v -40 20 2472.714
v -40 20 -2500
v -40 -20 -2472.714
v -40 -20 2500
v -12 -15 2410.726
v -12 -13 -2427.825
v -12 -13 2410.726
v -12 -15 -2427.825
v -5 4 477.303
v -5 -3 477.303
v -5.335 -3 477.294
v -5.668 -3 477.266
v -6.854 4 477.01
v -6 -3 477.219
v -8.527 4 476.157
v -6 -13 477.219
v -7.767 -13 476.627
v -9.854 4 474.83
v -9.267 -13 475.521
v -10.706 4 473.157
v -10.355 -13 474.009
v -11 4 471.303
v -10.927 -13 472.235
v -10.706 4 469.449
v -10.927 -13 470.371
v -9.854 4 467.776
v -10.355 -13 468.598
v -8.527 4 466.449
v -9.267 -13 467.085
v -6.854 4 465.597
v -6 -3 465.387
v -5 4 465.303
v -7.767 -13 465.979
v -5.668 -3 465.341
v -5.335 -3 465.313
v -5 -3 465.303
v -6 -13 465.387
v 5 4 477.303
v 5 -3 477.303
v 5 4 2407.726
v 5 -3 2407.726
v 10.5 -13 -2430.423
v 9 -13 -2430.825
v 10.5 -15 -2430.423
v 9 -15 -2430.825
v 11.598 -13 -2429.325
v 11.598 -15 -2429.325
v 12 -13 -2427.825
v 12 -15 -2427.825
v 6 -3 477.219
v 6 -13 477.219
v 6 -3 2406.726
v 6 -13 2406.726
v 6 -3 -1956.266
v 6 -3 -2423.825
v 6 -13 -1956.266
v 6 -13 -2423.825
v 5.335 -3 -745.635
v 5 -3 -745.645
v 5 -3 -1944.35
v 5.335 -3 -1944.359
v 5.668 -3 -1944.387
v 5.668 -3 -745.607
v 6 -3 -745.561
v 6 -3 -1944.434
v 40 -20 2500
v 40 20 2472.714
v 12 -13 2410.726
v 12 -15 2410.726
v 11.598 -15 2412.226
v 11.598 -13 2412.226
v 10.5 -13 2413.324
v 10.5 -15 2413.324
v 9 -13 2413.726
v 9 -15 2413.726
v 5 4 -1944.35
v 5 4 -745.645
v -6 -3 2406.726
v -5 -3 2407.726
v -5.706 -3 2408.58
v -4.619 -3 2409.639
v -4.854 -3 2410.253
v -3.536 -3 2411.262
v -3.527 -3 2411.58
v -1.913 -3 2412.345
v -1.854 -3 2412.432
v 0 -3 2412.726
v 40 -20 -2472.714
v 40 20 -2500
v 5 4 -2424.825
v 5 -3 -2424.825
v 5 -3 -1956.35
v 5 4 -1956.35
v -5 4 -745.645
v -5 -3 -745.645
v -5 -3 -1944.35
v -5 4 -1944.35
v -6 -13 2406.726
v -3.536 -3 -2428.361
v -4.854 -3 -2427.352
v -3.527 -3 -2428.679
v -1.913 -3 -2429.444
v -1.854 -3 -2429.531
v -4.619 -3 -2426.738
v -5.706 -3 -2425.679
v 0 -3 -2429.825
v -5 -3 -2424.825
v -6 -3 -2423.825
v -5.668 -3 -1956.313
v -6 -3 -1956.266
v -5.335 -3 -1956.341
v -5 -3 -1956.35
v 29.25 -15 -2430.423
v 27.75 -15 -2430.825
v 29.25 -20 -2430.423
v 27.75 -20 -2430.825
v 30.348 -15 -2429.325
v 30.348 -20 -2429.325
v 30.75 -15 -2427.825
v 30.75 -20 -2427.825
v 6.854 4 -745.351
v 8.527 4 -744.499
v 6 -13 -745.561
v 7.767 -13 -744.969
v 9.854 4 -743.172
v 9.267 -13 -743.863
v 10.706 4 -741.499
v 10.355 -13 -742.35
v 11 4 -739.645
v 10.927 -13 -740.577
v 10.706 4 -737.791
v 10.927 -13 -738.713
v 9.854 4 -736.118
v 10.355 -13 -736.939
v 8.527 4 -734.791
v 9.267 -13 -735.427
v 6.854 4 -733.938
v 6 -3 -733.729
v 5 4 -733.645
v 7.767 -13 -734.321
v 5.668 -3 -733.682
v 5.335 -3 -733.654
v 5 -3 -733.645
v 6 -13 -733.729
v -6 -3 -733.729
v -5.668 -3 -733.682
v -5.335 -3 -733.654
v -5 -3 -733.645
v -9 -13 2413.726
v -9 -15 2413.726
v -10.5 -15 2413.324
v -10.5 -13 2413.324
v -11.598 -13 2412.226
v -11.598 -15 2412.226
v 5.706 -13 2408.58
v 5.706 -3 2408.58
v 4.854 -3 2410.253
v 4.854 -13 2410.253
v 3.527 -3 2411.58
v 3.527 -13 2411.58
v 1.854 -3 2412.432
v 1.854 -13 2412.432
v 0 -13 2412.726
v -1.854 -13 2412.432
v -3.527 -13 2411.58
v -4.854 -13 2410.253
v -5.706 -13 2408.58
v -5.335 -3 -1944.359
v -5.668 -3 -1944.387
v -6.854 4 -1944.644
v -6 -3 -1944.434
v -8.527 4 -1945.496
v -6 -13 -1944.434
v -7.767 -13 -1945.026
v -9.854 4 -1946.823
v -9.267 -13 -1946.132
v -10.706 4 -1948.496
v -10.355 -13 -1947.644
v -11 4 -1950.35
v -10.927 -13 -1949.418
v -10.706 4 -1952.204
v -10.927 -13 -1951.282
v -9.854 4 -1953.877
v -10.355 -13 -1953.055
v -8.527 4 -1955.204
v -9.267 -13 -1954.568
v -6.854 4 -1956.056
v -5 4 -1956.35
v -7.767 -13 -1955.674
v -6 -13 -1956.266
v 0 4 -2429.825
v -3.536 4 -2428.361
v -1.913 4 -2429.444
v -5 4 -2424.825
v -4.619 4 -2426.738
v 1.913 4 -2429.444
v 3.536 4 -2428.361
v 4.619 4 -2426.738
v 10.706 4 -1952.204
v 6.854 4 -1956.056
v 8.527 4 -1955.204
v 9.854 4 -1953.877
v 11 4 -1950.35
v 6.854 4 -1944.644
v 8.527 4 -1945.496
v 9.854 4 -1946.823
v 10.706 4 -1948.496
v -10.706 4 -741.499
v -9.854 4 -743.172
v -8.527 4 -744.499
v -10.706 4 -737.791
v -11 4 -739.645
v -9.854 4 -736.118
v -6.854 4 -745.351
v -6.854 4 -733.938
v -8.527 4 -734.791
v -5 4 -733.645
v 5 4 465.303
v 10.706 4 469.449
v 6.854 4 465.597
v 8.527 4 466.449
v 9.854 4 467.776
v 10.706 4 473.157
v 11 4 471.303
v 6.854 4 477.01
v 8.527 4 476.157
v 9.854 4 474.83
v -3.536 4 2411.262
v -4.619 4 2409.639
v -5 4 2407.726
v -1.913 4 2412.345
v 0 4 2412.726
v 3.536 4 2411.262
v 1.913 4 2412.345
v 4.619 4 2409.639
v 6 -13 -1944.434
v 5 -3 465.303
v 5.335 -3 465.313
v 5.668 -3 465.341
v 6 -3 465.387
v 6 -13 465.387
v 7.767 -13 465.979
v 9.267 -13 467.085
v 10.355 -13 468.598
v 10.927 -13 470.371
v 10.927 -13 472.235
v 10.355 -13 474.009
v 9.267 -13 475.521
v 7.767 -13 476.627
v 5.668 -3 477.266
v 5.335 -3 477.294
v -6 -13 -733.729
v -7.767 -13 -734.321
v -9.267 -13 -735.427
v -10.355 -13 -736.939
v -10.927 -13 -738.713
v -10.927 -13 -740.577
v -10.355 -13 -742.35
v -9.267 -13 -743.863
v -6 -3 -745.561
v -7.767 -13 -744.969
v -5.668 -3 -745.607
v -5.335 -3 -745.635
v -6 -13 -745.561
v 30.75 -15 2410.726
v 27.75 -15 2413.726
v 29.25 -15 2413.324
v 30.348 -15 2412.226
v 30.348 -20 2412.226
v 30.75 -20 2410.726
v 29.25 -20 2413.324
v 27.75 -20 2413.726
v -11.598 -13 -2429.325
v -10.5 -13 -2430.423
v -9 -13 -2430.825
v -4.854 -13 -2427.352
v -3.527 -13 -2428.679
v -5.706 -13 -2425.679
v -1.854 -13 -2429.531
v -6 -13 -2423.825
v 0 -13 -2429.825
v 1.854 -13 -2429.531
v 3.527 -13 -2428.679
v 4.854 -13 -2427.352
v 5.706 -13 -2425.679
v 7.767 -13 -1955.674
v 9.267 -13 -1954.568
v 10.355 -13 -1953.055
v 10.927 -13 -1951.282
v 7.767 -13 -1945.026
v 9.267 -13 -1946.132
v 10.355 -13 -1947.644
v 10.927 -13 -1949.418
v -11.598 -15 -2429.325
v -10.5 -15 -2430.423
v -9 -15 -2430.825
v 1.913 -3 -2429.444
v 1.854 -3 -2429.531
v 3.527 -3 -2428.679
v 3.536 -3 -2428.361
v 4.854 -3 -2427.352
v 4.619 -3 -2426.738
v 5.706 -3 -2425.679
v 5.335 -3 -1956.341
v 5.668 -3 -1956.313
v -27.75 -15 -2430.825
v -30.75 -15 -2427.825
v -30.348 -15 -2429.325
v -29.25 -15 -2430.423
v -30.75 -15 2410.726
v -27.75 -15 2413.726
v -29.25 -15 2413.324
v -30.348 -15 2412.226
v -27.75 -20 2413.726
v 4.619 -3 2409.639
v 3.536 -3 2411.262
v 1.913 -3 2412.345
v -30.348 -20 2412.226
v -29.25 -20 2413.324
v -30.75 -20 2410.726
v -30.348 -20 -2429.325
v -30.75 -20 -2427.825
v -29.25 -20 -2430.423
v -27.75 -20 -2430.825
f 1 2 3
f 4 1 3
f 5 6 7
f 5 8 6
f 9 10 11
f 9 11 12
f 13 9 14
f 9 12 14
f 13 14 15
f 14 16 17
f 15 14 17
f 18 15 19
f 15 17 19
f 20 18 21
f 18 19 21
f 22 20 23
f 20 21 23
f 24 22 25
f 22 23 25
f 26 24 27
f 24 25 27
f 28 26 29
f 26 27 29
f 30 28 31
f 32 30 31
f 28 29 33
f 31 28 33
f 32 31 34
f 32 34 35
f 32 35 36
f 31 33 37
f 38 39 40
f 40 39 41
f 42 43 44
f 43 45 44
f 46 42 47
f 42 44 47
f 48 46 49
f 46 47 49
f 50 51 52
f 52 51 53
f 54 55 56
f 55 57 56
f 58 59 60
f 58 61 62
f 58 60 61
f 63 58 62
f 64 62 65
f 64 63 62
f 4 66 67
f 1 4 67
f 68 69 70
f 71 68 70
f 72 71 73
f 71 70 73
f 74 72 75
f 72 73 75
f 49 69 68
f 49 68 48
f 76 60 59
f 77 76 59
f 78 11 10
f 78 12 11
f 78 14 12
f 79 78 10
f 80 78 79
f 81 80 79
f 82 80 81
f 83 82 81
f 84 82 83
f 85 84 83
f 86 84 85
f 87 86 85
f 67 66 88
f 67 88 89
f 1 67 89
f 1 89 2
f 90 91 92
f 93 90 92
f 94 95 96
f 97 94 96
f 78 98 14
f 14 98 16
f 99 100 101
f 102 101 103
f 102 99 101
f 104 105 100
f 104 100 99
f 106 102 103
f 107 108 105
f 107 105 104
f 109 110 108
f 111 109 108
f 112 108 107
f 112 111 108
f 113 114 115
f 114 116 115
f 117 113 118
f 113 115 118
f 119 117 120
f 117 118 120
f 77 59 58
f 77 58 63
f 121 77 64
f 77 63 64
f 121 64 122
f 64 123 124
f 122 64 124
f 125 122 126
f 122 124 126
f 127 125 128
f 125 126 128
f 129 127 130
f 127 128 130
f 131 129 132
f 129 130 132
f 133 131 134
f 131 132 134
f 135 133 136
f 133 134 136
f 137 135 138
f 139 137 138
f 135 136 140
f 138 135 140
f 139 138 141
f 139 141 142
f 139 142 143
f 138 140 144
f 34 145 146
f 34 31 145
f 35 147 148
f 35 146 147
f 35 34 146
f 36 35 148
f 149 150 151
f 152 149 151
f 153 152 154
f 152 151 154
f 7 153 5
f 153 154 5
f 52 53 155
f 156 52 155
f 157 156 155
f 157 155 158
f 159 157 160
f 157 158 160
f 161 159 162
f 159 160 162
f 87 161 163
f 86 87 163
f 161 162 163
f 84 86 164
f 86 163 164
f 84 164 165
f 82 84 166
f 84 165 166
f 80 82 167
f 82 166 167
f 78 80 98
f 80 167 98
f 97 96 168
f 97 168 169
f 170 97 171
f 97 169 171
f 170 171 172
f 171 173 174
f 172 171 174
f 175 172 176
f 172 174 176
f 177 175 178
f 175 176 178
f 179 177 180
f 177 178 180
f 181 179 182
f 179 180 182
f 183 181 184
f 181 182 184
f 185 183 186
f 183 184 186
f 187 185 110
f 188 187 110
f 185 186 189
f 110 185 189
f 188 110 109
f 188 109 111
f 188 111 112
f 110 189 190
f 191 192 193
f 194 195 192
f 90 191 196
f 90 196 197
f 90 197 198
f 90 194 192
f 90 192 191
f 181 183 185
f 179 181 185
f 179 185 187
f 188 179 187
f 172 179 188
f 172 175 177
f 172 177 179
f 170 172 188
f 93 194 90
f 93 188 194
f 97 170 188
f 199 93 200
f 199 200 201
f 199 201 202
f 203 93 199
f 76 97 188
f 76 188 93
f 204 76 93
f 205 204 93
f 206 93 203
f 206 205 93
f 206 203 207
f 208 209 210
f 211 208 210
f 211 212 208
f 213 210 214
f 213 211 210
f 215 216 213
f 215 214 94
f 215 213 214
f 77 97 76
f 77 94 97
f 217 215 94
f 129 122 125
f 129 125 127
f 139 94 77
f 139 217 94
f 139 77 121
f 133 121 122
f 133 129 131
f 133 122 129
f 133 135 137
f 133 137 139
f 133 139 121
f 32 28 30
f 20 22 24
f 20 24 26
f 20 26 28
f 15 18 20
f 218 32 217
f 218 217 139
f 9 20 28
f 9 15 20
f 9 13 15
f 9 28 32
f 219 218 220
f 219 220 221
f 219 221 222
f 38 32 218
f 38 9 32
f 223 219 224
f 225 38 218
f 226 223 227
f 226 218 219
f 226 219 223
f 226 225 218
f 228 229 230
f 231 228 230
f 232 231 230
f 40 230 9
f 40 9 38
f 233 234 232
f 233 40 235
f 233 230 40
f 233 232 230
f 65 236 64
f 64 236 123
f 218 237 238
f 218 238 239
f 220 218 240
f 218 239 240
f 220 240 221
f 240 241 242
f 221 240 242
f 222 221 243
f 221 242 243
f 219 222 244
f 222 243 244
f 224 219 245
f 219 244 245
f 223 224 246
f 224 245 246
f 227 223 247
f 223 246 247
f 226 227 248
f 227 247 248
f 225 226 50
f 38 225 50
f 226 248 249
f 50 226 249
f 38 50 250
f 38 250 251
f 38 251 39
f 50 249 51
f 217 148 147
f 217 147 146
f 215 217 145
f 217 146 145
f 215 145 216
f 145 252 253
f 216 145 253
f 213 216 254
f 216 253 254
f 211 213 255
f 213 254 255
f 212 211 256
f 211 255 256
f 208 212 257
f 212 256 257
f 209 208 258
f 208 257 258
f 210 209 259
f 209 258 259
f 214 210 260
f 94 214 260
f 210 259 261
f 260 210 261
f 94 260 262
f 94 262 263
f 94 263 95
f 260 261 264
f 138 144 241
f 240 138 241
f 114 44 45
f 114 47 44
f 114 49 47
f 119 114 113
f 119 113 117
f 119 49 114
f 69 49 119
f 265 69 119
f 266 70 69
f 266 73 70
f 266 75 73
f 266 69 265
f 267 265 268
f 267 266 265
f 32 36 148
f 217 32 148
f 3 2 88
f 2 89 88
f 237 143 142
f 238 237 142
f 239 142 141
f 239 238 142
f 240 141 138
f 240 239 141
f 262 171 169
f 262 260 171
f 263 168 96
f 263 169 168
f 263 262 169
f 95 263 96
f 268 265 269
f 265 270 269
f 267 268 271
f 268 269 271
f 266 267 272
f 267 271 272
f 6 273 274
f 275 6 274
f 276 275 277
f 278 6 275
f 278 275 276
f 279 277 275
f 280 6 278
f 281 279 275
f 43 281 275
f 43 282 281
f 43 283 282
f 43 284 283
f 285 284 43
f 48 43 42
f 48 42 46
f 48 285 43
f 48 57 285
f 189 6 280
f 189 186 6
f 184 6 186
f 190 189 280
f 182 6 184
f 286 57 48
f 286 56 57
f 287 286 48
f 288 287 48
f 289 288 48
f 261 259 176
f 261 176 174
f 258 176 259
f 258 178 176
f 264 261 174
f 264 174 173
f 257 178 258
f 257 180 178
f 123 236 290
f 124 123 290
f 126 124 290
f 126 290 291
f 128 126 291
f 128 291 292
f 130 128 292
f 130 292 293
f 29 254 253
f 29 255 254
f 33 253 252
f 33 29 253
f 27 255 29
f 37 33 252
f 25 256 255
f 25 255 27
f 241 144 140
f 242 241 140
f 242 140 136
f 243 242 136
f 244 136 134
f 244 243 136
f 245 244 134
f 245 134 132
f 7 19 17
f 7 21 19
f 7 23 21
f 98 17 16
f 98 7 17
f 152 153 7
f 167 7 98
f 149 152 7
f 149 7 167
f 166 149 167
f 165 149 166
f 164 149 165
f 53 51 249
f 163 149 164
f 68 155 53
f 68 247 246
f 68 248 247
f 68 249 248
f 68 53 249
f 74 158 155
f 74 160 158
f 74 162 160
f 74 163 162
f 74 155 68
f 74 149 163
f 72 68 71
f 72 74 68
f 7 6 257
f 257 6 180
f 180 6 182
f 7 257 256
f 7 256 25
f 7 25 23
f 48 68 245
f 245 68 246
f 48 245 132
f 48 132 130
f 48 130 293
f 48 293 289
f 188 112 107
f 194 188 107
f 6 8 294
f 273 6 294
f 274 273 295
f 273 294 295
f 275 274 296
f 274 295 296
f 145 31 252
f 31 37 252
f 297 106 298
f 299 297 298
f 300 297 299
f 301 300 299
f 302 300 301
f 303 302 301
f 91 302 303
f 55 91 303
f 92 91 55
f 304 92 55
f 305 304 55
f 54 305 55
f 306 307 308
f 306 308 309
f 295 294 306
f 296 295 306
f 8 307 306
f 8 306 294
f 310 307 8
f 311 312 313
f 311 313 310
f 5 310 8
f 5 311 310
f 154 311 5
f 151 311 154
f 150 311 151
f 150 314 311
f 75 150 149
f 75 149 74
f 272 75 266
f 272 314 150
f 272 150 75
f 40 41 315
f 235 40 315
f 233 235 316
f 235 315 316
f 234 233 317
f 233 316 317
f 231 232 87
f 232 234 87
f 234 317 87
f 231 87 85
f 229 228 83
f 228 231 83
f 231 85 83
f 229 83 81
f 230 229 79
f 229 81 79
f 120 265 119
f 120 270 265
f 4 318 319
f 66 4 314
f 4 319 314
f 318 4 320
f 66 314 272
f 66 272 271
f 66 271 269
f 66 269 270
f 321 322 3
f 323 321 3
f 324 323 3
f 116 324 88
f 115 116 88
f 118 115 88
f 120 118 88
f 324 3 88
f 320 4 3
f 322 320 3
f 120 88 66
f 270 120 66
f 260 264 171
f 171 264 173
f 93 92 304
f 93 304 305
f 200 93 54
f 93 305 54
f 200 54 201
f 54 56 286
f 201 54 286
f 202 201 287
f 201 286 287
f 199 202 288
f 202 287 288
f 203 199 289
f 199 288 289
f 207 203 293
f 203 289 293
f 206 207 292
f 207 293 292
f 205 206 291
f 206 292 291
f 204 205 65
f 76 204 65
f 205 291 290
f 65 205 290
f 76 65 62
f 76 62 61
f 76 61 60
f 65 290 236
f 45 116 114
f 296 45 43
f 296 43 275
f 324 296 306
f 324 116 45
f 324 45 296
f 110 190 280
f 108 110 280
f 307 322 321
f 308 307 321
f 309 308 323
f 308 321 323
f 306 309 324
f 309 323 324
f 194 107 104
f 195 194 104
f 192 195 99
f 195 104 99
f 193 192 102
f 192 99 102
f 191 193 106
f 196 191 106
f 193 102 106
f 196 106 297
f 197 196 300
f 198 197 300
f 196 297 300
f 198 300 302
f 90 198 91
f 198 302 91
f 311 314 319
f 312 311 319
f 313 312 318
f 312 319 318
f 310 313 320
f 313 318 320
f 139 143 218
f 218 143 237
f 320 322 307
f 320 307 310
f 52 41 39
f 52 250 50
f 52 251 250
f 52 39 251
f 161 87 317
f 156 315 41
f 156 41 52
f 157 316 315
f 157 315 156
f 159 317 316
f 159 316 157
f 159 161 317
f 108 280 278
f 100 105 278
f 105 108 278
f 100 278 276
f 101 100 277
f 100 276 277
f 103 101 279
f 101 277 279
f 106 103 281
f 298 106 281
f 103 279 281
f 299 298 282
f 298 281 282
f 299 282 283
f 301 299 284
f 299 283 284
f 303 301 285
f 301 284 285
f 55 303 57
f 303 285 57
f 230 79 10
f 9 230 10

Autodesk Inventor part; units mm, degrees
ref_plane "YZ Plane" through (0, 0, 0) normal (1, 0, 0) x (0, 1, 0)
ref_plane "XZ Plane" through (0, 0, 0) normal (0, 1, 0) x (-1, 0, 0)
ref_plane "XY Plane" through (0, 0, 0) normal (0, 0, 1) x (1, 0, 0)
sketch "Sketch1" plane through (0, 0, 0) normal (0, 0, 1) x (1, 0, 0)
  line L0 (-56, 0) -> (56, 0) projected
  line L1 (40, -20) -> (40, 20)
  line L2 (40, 20) -> (-40, 20)
  line L3 (-40, 20) -> (-40, -20)
  line L4 (-40, -20) -> (40, -20)
  point P0 (0, 0)
  dimension "d8" = 80
  dimension "d9" = 40
  dimension "d11" = 40
extrude "brædt" add sketch "Sketch1" along normal mid plane 5000
sketch "Sketch2" plane through (40, -20, -2500) normal (0, -1, 0) x (1, 0, 0)
  line L0 (0, 5000) -> (0, 0) projected
  line L1 (-80, 5000) -> (0, 5000) projected
  line L2 (-80, 0) -> (-80, 5000) projected
  line L3 (0, 0) -> (-80, 0) projected
  line L4 (-40, -1000) -> (-40, 6000) projected
  line L5 (-12.25, 69.175) -> (-67.75, 69.175)
  line L6 (-70.75, 72.175) -> (-70.75, 4910.726)
  line L7 (-67.75, 4913.726) -> (-12.25, 4913.726)
  line L8 (-9.25, 4910.726) -> (-9.25, 72.175)
  arc A0 (-70.75, 72.175) -> (-67.75, 69.175) centre (-67.75, 72.175) ccw
  arc A1 (-12.25, 69.175) -> (-9.25, 72.175) centre (-12.25, 72.175) ccw
  arc A2 (-67.75, 4913.726) -> (-70.75, 4910.726) centre (-67.75, 4910.726) ccw
  arc A3 (-9.25, 4910.726) -> (-12.25, 4913.726) centre (-12.25, 4910.726) ccw
  point P0 (-40, 2500)
  dimension "d12" = 61.5
  dimension "d13" = 4844.551
  dimension "d14" = 3
  dimension "d29" = 69.175
extrude "spor til stål-håndfang" cut sketch "Sketch2" against normal blind 5 contours L7 A3 L8 A1 L5 L4 | L4 L5 A0 L6 A2 L7
sketch "Sketch3" plane through (40, -15, -2500) normal (0, -1, 0) x (1, 0, 0)
  line L0 (-70.75, 72.175) -> (-70.75, 4910.726) projected
  arc A0 (-70.75, 72.175) -> (-67.75, 69.175) centre (-67.75, 72.175) ccw projected
  line L1 (-12.25, 69.175) -> (-67.75, 69.175) projected
  arc A1 (-12.25, 69.175) -> (-9.25, 72.175) centre (-12.25, 72.175) ccw projected
  line L2 (-9.25, 4910.726) -> (-9.25, 72.175) projected
  arc A2 (-9.25, 4910.726) -> (-12.25, 4913.726) centre (-12.25, 4910.726) ccw projected
  line L3 (-67.75, 4913.726) -> (-12.25, 4913.726) projected
  arc A3 (-67.75, 4913.726) -> (-70.75, 4910.726) centre (-67.75, 4910.726) ccw projected
  line L4 (-40, 4906.726) -> (-40, 76.175) construction
  line L5 (-46, 4906.726) -> (-46, 76.175)
  line L6 (-34, 76.175) -> (-34, 4906.726)
  arc A4 (-34, 4906.726) -> (-46, 4906.726) centre (-40, 4906.726) ccw
  arc A5 (-46, 76.175) -> (-34, 76.175) centre (-40, 76.175) ccw
  line L7 (-40, -1000) -> (-40, 6000) projected
  point P0 (-40, 2500)
  point P1 (-40, 2491.4505)
  dimension "d19" = 12
  dimension "d22" = 1
  dimension "d23" = 1
extrude "spor til LED og liste" cut sketch "Sketch3" against normal blind 12 contours L7 A4 L6 A5 | A5 L5 A4 L7
sketch "Sketch4" plane through (40, -3, -2500) normal (0, -1, 0) x (1, 0, 0)
  line L0 (-46, 76.175) -> (-46, 4906.726) projected
  arc A0 (-46, 76.175) -> (-34, 76.175) centre (-40, 76.175) ccw projected
  line L1 (-34, 4906.726) -> (-34, 76.175) projected
  arc A1 (-34, 4906.726) -> (-46, 4906.726) centre (-40, 4906.726) ccw projected
  line L2 (-40, -1000) -> (-40, 6000) projected
  line L3 (-40, 4907.726) -> (-40, 75.175) construction
  line L4 (-45, 4907.726) -> (-45, 75.175)
  line L5 (-35, 75.175) -> (-35, 4907.726)
  arc A2 (-35, 4907.726) -> (-45, 4907.726) centre (-40, 4907.726) ccw
  arc A3 (-45, 75.175) -> (-35, 75.175) centre (-40, 75.175) ccw
  point P0 (-40, 2500)
  point P1 (-40, 2491.4505)
  dimension "d24" = 10
  dimension "d25" = 0
  dimension "d26" = 0
extrude "spor til ledninger" cut sketch "Sketch4" against normal blind 7 contours A3 L4 A2 L2 | L2 A2 L5 A3
sketch "Sketch5" plane through (40, 20, 2500) normal (1, 0, 0) x (0, 0, -1)
  line L0 (0, 0) -> (5000, 0) projected
  line L1 (0, -40) -> (0, 0) projected
  line L2 (0, -40) -> (5000, -40) projected
  line L3 (5000, 0) -> (5000, -40) projected
  line L4 (5000, 0) -> (5000, -40) projected
  line L5 (5000, 0) -> (4972.7139, -40)
  line L6 (0, -40) -> (5000, -40) projected
  point P0 (2500, -20)
  dimension "d30" = 34.3
extrude "endeafskær top" cut sketch "Sketch5" against normal through all contours L3 L2 L5
sketch "Sketch6" plane through (40, 20, 2500) normal (1, 0, 0) x (0, 0, -1)
  line L0 (4972.7139, -40) -> (5000, 0) projected
  line L1 (0, 0) -> (5000, 0) projected
  line L2 (0, -40) -> (0, 0) projected
  line L3 (0, -40) -> (4972.7139, -40) projected
  line L4 (0, -40) -> (0, 0) projected
  line L5 (0, -40) -> (27.2861, 0)
  point P0 (2500, -20)
  dimension "d33" = 34.3
extrude "endeafskær bund" cut sketch "Sketch6" against normal through all contours L2 L1 L5
fillet "Fillet2" [suppressed]
fillet "Fillet3" [suppressed]
fillet "Fillet4" [suppressed]
fillet "Fillet5" [suppressed]
sketch "Sketch7" plane through (40, -15, -2500) normal (0, -1, 0) x (1, 0, 0)
  ellipse E0 centre (-40, 566.2041) end of major axis (-40, 591.0196) minor radius 20.5 projected
  ellipse E1 centre (-40, 1776.9092) end of major axis (-40, 1801.7247) minor radius 20.5 projected
  ellipse E2 centre (-40, 2987.8572) end of major axis (-40, 3012.6727) minor radius 20.5 projected
  line L0 (-93.9939, 549.6501) -> (45.3161, 549.6501) construction
  line L1 (-103.3896, 1760.3552) -> (51.928, 1760.3552) construction
  line L2 (-132.8398, 2971.3032) -> (53.2138, 2971.3032) construction
  line L3 (-45, 75.175) -> (-45, 4907.726) construction
  arc A0 (-45, 75.175) -> (-35, 75.175) centre (-40, 75.175) ccw construction
  line L4 (-35, 4907.726) -> (-35, 75.175) construction
  arc A1 (-35, 4907.726) -> (-45, 4907.726) centre (-40, 4907.726) ccw construction
  circle A2 centre (-45, 549.6501) radius 6
  circle A3 centre (-35, 549.6501) radius 6
  circle A4 centre (-35, 1760.3552) radius 6
  circle A5 centre (-45, 1760.3552) radius 6
  circle A6 centre (-45, 2971.3032) radius 6
  circle A7 centre (-35, 2971.3032) radius 6
  point P0 (-40, 2500)
  dimension "d38" = 12
  dimension "d39" = 12
  dimension "d40" = 12
  dimension "d41" = 12
  dimension "d42" = 12
  dimension "d43" = 12
extrude "pilothuller" cut sketch "Sketch7" against normal up to surface (19 mm away) contours A2 A3 | A2 A3 | A3 A2 | A4 A5 | A5 A4 | A4 A5 | A6 A7 | A6 A7 | A7 A6
sketch "Sketch8" plane through (40, -15, -2500) normal (0, -1, 0) x (1, 0, 0)
  line L0 (-70.75, 72.175) -> (-70.75, 4910.726) projected
  arc A0 (-70.75, 72.175) -> (-67.75, 69.175) centre (-67.75, 72.175) ccw projected
  line L1 (-12.25, 69.175) -> (-67.75, 69.175) projected
  arc A1 (-12.25, 69.175) -> (-9.25, 72.175) centre (-12.25, 72.175) ccw projected
  line L2 (-9.25, 4910.726) -> (-9.25, 72.175) projected
  arc A2 (-9.25, 4910.726) -> (-12.25, 4913.726) centre (-12.25, 4910.726) ccw projected
  line L3 (-67.75, 4913.726) -> (-12.25, 4913.726) projected
  arc A3 (-67.75, 4913.726) -> (-70.75, 4910.726) centre (-67.75, 4910.726) ccw projected
  arc A4 (-34, 543.734) -> (-34, 555.5662) centre (-35, 549.6501) ccw projected
  line L4 (-34, 543.734) -> (-34, 76.175) projected
  arc A5 (-46, 76.175) -> (-34, 76.175) centre (-40, 76.175) ccw projected
  line L5 (-46, 76.175) -> (-46, 543.734) projected
  arc A6 (-46, 555.5662) -> (-46, 543.734) centre (-45, 549.6501) ccw projected
  line L6 (-46, 555.5662) -> (-46, 1754.4392) projected
  arc A7 (-46, 1766.2713) -> (-46, 1754.4392) centre (-45, 1760.3552) ccw projected
  line L7 (-46, 1766.2713) -> (-46, 2965.3872) projected
  arc A8 (-46, 2977.2193) -> (-46, 2965.3872) centre (-45, 2971.3032) ccw projected
  line L8 (-46, 2977.2193) -> (-46, 4906.726) projected
  arc A9 (-34, 4906.726) -> (-46, 4906.726) centre (-40, 4906.726) ccw projected
  line L9 (-34, 4906.726) -> (-34, 2977.2193) projected
  arc A10 (-34, 2965.3872) -> (-34, 2977.2193) centre (-35, 2971.3032) ccw projected
  line L10 (-34, 2965.3872) -> (-34, 1766.2713) projected
  arc A11 (-34, 1754.4392) -> (-34, 1766.2713) centre (-35, 1760.3552) ccw projected
  line L11 (-34, 1754.4392) -> (-34, 555.5662) projected
  line L12 (-49, 4913.726) -> (-31, 4913.726)
  line L13 (-28, 4910.726) -> (-28, 72.175)
  line L14 (-31, 69.175) -> (-49, 69.175)
  line L15 (-52, 72.175) -> (-52, 4910.726)
  line L16 (-40, -1000) -> (-40, 6000) construction
  arc A12 (-28, 4910.726) -> (-31, 4913.726) centre (-31, 4910.726) ccw
  arc A13 (-49, 4913.726) -> (-52, 4910.726) centre (-49, 4910.726) ccw
  arc A14 (-31, 69.175) -> (-28, 72.175) centre (-31, 72.175) ccw
  arc A15 (-52, 72.175) -> (-49, 69.175) centre (-49, 72.175) ccw
  point P0 (-40, 2500)
  point P1 (-52, 4913.726)
  point P2 (-28, 4913.726)
  dimension "d46" = 24
  dimension "d47" = 3
  dimension "d52" = 0
  dimension "d53" = 0
extrude "spor til acryl" cut sketch "Sketch8" against normal blind 2 contours A15 L15 A13 L3 A12 L13 A14 L1 | L4 A5 L5 A6 L6 A7 L7 A8 L8 A9 L9 A10 L10 A11 L11 A4
equation "\"d11\" = 0.5 * d8"
equation "\"d30\" = trappevinkel"
equation "\"d33\" = trappevinkel"
equation "\"d39\" = d38"
equation "\"d40\" = d38"
equation "\"d41\" = d38"
equation "\"d42\" = d38"
equation "\"d43\" = d38"
equation "\"pladetykkelse\" = 3"
equation "\"trappevinkel\" = 34.3deg"
equation "\"trappestifter_dia\" = 25"
equation "\"trappestifter_huldia\" = 25.8"
equation "\"trappestifter_skraa_huldia\" = 26.6"
equation "\"trappestifter_laengde\" = 228"
equation "\"perforeringsbredde\" = 6"
equation "\"perforeringshullaengde\" = 62.8"
equation "\"perforeringshullaengde_top\" = 61"
equation "\"perforeringshullaengde_bund\" = 61.6"
equation "\"perforeringsoffset\" = 8"
equation "\"perforeringsoffset_top\" = 8"
equation "\"perforeringsoffset_bund\" = 8"
equation "\"laskehul_dia\" = 13"
equation "\"balusterhul_udvidelse\" = 1"
equation "\"trinbredde\" = 1884"
properties part number "træhåndfang" material "Wood (Birch)"
